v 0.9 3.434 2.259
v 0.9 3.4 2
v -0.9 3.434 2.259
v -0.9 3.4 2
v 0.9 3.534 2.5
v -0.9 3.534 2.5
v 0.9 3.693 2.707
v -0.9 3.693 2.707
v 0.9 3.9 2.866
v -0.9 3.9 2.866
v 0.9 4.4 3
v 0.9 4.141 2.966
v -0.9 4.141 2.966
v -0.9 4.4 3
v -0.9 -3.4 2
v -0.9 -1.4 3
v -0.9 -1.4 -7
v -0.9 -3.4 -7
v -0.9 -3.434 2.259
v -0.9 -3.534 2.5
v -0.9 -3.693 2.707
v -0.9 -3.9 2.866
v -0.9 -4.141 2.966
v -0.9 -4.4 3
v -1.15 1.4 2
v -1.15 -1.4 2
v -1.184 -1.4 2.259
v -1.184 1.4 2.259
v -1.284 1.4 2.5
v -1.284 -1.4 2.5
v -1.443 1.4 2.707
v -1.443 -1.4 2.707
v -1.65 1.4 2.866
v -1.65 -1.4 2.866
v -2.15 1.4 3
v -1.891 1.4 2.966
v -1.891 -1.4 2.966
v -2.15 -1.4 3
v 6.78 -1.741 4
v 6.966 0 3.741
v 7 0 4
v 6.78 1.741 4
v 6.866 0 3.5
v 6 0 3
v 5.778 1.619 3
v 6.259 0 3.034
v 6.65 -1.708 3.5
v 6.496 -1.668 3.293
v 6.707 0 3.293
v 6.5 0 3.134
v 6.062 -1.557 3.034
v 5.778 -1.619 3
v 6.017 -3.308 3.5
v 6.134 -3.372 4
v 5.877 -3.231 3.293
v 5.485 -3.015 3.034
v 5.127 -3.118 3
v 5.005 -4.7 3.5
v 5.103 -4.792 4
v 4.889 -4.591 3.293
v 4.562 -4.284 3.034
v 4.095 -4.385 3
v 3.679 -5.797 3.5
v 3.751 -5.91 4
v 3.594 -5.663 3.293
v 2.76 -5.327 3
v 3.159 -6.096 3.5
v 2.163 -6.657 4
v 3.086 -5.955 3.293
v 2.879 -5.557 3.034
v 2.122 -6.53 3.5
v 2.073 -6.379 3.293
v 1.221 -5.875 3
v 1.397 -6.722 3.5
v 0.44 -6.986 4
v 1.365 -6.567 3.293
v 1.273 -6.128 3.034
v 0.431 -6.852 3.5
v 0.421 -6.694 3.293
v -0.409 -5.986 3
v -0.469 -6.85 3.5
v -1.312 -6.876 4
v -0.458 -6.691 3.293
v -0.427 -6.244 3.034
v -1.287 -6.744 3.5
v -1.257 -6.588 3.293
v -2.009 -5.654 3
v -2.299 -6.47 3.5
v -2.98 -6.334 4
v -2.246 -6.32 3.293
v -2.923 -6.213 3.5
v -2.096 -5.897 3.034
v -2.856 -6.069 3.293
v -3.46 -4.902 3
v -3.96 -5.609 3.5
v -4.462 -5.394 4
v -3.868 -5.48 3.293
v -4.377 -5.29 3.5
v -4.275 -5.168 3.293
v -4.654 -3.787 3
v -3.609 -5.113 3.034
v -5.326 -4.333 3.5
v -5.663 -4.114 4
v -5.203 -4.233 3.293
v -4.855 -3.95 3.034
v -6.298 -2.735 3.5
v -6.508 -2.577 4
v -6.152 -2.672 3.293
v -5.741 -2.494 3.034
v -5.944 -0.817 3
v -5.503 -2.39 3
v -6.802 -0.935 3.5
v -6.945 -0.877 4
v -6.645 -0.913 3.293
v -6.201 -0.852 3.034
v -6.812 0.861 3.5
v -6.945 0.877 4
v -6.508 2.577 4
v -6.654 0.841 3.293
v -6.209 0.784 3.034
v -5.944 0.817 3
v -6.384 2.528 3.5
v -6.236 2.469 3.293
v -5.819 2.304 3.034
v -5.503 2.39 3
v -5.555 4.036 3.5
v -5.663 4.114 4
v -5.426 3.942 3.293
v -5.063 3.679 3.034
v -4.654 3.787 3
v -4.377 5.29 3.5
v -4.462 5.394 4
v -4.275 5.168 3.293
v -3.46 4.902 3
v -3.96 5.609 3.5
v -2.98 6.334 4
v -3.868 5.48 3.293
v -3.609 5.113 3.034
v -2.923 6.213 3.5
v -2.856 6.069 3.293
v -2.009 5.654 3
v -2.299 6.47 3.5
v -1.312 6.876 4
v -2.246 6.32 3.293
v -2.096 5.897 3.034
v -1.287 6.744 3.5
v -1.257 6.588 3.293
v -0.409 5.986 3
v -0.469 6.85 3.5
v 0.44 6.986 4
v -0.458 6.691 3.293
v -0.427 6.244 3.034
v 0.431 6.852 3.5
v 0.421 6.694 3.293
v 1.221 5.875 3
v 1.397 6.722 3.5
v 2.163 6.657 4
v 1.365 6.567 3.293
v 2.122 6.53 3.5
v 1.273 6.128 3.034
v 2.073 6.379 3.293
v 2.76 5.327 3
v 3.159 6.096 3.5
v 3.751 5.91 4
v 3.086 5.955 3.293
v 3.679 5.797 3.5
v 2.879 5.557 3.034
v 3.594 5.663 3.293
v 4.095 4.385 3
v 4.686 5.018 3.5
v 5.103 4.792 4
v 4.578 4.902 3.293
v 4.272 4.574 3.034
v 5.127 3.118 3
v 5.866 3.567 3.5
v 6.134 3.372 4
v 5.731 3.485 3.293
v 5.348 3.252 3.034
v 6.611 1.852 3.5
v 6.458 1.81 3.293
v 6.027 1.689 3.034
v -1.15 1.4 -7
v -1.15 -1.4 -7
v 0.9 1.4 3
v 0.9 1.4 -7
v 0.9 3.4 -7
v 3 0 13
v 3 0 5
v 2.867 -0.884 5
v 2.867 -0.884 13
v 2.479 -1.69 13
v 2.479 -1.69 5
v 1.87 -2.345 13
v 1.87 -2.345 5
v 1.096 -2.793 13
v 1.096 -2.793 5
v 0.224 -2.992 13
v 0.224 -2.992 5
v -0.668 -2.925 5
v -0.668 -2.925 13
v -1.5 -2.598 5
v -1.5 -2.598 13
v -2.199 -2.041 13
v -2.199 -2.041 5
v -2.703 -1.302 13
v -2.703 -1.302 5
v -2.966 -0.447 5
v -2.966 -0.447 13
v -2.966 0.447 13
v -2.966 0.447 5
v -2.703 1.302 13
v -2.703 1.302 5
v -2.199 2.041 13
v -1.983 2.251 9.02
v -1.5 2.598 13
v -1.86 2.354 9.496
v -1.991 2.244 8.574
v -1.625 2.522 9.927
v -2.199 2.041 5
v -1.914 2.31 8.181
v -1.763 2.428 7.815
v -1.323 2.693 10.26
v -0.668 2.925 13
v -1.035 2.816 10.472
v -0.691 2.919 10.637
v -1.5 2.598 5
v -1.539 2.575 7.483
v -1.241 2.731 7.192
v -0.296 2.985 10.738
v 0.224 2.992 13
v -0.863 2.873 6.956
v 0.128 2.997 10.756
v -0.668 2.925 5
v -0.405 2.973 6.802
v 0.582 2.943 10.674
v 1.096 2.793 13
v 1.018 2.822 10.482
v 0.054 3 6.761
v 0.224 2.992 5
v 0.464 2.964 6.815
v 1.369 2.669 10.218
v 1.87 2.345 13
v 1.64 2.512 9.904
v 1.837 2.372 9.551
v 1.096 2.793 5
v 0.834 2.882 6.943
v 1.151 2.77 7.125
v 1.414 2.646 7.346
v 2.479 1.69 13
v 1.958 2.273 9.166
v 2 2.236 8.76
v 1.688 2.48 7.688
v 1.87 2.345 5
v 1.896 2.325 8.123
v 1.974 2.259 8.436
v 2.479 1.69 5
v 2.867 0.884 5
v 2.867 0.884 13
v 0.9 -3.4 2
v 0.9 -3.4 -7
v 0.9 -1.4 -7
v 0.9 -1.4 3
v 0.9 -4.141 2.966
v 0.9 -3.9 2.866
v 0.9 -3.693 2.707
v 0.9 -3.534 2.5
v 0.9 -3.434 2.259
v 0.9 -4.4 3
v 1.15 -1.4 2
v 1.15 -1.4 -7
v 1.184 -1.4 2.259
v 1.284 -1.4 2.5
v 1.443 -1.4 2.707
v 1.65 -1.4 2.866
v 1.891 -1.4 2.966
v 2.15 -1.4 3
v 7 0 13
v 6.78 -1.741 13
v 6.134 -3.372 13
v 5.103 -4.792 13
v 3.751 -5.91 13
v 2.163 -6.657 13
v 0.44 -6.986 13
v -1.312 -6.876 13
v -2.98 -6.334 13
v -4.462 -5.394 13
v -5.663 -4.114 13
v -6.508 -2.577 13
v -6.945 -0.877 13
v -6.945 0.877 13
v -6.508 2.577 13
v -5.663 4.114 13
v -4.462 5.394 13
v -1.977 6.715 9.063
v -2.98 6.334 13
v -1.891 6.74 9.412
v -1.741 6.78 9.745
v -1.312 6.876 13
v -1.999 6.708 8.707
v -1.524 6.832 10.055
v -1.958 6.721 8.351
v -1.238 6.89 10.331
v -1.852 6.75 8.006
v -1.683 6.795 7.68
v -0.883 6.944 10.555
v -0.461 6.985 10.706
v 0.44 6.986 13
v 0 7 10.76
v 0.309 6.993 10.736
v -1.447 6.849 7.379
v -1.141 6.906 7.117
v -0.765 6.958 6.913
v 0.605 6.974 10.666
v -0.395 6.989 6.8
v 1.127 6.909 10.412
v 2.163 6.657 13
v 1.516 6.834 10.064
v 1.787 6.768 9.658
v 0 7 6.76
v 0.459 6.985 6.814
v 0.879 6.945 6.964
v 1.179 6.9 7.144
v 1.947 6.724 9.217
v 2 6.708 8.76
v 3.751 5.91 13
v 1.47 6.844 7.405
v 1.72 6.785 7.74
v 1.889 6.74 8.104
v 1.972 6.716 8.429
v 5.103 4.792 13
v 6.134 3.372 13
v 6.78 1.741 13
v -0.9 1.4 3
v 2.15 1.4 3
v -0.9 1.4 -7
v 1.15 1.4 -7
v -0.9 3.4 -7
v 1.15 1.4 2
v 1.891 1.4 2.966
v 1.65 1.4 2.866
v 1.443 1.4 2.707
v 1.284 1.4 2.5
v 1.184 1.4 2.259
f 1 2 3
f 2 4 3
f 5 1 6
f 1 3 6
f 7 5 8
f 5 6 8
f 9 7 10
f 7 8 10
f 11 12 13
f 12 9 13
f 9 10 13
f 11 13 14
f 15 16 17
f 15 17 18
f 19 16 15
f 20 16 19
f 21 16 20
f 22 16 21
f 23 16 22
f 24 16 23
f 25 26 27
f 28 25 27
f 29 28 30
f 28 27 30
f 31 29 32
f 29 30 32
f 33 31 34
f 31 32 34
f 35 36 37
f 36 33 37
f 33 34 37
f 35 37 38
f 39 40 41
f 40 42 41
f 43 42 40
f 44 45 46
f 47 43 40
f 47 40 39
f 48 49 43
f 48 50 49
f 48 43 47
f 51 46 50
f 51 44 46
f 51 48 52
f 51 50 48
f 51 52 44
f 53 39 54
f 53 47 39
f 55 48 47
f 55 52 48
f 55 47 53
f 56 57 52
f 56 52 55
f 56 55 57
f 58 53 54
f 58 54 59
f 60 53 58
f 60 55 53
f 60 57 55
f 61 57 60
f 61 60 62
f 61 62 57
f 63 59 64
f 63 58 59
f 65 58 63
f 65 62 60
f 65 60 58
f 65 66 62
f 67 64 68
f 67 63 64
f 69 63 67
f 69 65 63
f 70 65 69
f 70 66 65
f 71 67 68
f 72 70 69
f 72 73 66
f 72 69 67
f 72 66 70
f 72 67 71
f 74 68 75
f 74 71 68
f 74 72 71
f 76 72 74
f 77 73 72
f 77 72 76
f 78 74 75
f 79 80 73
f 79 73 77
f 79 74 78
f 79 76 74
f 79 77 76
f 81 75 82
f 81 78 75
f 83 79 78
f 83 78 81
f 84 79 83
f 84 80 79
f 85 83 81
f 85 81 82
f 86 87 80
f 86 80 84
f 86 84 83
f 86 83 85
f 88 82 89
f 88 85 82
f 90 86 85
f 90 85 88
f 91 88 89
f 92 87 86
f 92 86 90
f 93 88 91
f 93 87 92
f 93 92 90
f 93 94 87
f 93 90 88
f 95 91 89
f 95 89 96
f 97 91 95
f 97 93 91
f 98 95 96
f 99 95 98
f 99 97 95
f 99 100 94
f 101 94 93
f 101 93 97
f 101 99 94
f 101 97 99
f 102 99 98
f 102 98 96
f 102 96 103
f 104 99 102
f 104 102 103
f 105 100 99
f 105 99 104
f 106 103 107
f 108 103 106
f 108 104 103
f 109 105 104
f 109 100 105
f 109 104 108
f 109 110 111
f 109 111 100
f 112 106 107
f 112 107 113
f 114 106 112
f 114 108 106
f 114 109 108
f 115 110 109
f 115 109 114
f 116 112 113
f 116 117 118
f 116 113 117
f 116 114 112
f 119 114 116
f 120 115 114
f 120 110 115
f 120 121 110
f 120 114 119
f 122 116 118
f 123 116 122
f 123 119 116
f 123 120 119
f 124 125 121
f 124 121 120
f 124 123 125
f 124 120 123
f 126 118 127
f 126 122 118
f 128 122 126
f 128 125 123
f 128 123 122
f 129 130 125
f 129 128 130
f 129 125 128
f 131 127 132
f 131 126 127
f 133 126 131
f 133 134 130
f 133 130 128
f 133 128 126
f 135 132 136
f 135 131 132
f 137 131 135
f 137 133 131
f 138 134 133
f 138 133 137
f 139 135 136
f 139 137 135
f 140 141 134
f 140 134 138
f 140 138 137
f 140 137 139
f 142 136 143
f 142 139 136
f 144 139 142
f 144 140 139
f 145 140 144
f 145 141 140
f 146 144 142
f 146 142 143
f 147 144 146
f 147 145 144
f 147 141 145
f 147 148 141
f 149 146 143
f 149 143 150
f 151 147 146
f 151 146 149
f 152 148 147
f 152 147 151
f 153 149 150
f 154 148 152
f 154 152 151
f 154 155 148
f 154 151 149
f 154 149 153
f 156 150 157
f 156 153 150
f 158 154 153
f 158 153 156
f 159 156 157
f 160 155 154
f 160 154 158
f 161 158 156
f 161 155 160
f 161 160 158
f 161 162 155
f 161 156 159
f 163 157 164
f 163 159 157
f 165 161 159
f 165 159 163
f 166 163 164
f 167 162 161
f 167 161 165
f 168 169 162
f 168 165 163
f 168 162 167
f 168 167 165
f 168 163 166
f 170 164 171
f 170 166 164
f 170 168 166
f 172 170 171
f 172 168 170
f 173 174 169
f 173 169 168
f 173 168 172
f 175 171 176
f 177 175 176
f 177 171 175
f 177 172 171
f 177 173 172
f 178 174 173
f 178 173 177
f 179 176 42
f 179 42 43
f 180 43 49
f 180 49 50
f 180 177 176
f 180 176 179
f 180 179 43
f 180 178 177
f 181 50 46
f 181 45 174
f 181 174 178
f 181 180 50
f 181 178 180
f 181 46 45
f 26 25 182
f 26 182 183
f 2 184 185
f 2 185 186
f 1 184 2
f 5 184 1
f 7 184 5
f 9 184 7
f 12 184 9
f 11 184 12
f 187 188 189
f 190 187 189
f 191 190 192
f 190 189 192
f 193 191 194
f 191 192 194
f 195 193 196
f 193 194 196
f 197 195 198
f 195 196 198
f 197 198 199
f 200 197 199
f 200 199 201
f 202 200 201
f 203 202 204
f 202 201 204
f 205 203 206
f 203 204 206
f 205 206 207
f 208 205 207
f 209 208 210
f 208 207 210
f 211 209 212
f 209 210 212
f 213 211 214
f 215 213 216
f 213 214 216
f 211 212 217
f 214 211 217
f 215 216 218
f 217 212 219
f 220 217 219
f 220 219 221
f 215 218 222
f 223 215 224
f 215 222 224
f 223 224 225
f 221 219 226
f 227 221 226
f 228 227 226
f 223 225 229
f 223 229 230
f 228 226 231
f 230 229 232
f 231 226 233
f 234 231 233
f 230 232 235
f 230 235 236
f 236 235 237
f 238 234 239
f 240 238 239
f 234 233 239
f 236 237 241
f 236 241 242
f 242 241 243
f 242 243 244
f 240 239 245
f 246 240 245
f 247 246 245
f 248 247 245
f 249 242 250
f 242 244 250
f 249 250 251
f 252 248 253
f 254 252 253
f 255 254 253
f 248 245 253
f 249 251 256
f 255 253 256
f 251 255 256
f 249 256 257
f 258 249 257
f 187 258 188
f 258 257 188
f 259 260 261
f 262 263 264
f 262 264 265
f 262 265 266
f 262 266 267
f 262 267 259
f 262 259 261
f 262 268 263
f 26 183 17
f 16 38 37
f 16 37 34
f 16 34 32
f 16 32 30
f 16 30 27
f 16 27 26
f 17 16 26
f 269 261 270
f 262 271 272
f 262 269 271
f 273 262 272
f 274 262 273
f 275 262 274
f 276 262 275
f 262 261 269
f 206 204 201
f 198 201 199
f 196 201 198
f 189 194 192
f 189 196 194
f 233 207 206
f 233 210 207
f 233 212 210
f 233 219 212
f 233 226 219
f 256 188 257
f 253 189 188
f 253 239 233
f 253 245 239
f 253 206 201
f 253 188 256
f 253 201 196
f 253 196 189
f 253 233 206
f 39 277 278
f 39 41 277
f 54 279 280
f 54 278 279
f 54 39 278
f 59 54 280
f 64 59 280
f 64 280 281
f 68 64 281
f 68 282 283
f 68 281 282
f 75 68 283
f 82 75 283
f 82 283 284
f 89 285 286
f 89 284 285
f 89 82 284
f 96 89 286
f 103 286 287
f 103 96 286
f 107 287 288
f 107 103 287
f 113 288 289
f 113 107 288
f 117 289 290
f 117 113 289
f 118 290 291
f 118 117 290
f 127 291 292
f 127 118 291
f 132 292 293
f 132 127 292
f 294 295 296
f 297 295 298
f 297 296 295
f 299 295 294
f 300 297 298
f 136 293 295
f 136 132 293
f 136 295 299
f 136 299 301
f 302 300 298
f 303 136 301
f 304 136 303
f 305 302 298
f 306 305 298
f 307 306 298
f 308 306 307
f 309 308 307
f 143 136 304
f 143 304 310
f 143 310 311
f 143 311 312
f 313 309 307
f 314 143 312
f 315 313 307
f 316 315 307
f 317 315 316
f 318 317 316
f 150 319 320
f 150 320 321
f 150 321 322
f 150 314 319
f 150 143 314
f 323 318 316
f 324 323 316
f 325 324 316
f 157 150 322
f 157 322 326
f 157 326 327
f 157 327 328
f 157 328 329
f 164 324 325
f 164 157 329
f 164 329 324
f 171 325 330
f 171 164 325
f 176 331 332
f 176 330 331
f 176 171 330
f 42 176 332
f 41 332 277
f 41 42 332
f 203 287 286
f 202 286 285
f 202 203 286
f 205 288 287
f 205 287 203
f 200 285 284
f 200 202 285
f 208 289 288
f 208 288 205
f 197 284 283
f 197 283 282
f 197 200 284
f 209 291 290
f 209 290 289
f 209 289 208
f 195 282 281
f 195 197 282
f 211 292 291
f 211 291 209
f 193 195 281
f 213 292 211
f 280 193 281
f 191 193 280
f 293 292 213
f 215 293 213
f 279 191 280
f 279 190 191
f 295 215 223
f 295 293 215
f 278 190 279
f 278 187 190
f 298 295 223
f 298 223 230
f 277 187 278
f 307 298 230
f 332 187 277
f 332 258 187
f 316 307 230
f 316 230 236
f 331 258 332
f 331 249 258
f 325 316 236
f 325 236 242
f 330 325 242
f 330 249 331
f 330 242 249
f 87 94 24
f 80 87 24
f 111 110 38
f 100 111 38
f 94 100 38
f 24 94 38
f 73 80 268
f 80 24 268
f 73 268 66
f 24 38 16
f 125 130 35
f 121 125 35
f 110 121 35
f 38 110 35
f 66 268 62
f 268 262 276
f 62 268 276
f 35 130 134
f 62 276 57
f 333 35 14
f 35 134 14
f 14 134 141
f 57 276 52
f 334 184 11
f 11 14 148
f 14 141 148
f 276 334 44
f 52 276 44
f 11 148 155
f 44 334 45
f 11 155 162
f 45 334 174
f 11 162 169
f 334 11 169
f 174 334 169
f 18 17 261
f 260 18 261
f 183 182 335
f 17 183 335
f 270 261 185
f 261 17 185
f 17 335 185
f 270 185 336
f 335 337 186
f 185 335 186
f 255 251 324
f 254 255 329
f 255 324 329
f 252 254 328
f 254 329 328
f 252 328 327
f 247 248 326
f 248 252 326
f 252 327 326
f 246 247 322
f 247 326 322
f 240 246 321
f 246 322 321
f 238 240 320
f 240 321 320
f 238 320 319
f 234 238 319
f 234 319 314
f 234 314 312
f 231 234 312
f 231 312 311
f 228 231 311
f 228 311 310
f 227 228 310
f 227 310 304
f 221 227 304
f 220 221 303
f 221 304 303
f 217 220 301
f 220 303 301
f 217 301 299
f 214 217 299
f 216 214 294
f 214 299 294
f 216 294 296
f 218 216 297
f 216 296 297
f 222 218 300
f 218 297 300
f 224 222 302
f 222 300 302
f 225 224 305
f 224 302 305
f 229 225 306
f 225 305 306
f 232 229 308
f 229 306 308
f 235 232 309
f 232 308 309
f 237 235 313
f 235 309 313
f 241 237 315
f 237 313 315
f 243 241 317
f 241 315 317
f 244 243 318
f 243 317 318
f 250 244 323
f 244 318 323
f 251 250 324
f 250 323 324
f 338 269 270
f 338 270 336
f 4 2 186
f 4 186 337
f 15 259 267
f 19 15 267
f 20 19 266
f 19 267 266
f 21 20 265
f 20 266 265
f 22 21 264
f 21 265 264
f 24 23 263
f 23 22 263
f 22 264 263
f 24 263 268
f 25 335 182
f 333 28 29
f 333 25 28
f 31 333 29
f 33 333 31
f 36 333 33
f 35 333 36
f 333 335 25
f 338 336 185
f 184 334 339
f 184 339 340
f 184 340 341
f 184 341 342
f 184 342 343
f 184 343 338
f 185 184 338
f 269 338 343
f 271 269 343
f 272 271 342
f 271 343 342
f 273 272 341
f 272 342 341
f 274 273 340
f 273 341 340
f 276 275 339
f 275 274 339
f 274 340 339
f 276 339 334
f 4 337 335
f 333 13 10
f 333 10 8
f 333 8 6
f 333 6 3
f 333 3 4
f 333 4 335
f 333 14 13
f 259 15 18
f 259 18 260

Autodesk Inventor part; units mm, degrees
ref_plane "YZ Plane" through (0, 0, 0) normal (1, 0, 0) x (0, 1, 0)
ref_plane "XZ Plane" through (0, 0, 0) normal (0, 1, 0) x (-1, 0, 0)
ref_plane "XY Plane" through (0, 0, 0) normal (0, 0, 1) x (1, 0, 0)
sketch "Sketch1" plane through (0, 0, 0) normal (0, 0, 1) x (1, 0, 0)
  line L0 (1.25, -1.5) -> (1, -1.5) projected
  line L1 (1, -1.5) -> (1, -3.5) projected
  line L2 (1, -3.5) -> (-1, -3.5) projected
  line L3 (-1, -3.5) -> (-1, -1.5) projected
  line L4 (-1, -1.5) -> (-1.25, -1.5) projected
  line L5 (-1.25, -1.5) -> (-1.25, 1.5) projected
  line L6 (-1.25, 1.5) -> (-1, 1.5) projected
  line L7 (-1, 1.5) -> (-1, 3.5) projected
  line L8 (-1, 3.5) -> (1, 3.5) projected
  line L9 (1, 3.5) -> (1, 1.5) projected
  line L10 (1, 1.5) -> (1.25, 1.5) projected
  line L11 (1.25, 1.5) -> (1.25, -1.5) projected
  circle A0 centre (4.5, 0) radius 1.55 projected
  circle A1 centre (-4.5, 0) radius 1.55 projected
  circle A2 centre (0, 0) radius 8 projected
  line L12 (-0.9, -1.4) -> (-0.9, -3.4)
  line L13 (-0.9, -3.4) -> (0.9, -3.4)
  line L14 (0.9, -3.4) -> (0.9, -1.4)
  line L15 (0.9, -1.4) -> (1.15, -1.4)
  line L16 (1.15, -1.4) -> (1.15, 1.4)
  line L17 (1.15, 1.4) -> (0.9, 1.4)
  line L18 (0.9, 1.4) -> (0.9, 3.4)
  line L19 (0.9, 3.4) -> (-0.9, 3.4)
  line L20 (-0.9, 3.4) -> (-0.9, 1.4)
  line L21 (-0.9, 1.4) -> (-1.15, 1.4)
  line L22 (-1.15, 1.4) -> (-1.15, -1.4)
  line L23 (-1.15, -1.4) -> (-0.9, -1.4)
  point P0 (0, 0)
  dimension "d0" = 0.1
extrude "Extrusion1" add sketch "Sketch1" against normal blind 7 contours L23 L22 L21 L20 L19 L18 L17 L16 L15 L14 L13 L12
sketch "Sketch2" plane through (0, 0, 0) normal (0, 0, 1) x (1, 0, 0)
  line L0 (-0.9, -3.4) -> (0.9, -3.4) projected
  line L1 (0.9, -3.4) -> (0.9, -1.4) projected
  line L2 (0.9, -1.4) -> (1.15, -1.4) projected
  line L3 (1.15, -1.4) -> (1.15, 1.4) projected
  line L4 (1.15, 1.4) -> (0.9, 1.4) projected
  line L5 (0.9, 1.4) -> (0.9, 3.4) projected
  line L6 (0.9, 3.4) -> (-0.9, 3.4) projected
  line L7 (-0.9, 3.4) -> (-0.9, 1.4) projected
  line L8 (-0.9, 1.4) -> (-1.15, 1.4) projected
  line L9 (-1.15, 1.4) -> (-1.15, -1.4) projected
  line L10 (-1.15, -1.4) -> (-0.9, -1.4) projected
  line L11 (-0.9, -1.4) -> (-0.9, -3.4) projected
  point P0 (0, 0)
extrude "Extrusion2" add sketch "Sketch2" along normal blind 3
sketch "Sketch3" plane through (0, 0, 3) normal (0, 0, 1) x (1, 0, 0)
  circle A0 centre (0, 0) radius 3
  line L0 (0, 0) -> (-1.5, 0)
  line L1 (-1.5, -2.5981) -> (-1.5, 2.5981)
  line L2 (-1.5, -2.5981) -> (3.6962, -2.5981) construction
  circle A1 centre (0, 0) radius 7
  dimension "d5" = 6
  dimension "d6" = 1.5
  dimension "d7" = 90
  dimension "d8" = 14
extrude "Extrusion3" add sketch "Sketch3" along normal blind 2 contours A0 L1 | L1 A0 | A1
sketch "Sketch4" plane through (0, 0, 5) normal (0, 0, 1) x (1, 0, 0)
  circle A0 centre (0, 0) radius 3
  line L0 (0, 0) -> (0, -1.5)
  line L1 (2.5981, -1.5) -> (-2.5981, -1.5)
  circle A1 centre (0, 0) radius 7 projected
  dimension "d11" = 6
  dimension "d12" = 1.5
extrude "Extrusion4" add sketch "Sketch4" along normal blind 10
fillet "Fillet1" radius 1 1 edges at (-7, 0, 3)
fillet "Fillet2" radius 1 4 edges at (0, -3.4, 3) (1.15, 0, 3) (-1.15, 0, 3) (0, 3.4, 3)
sketch "Sketch6" plane through (0, 0, 15) normal (0, 0, 1) x (1, 0, 0)
  circle A0 centre (0, 0) radius 5 projected
  circle A1 centre (0, 0) radius 3 projected
  circle A2 centre (0, 0) radius 3 projected
  circle A3 centre (0, 0) radius 7
  point P0 (-2.5981, -1.5)
  point P1 (2.5981, -1.5)
extrude "Extrusion6" cut sketch "Sketch6" against normal blind 2 contours A0 | A1 | A3
ref_plane "Work Plane2" through (0, 7, 3) normal (0, -1, 0) x (1, 0, 0)
ref_plane "Work Plane1" through (20.4658, -7.5, 10.75) normal (0, -1, 0) x (1, 0, 0)
sketch "Sketch8" plane through (0, 7, 3) normal (0, -1, 0) x (1, 0, 0)
  circle A0 centre (0, 5.7603) radius 2
  point P0 (0, -3)
  dimension "d22" = 4
extrude "Extrusion7" cut sketch "Sketch8" along normal blind 5
properties part number "Pot_adapter"
